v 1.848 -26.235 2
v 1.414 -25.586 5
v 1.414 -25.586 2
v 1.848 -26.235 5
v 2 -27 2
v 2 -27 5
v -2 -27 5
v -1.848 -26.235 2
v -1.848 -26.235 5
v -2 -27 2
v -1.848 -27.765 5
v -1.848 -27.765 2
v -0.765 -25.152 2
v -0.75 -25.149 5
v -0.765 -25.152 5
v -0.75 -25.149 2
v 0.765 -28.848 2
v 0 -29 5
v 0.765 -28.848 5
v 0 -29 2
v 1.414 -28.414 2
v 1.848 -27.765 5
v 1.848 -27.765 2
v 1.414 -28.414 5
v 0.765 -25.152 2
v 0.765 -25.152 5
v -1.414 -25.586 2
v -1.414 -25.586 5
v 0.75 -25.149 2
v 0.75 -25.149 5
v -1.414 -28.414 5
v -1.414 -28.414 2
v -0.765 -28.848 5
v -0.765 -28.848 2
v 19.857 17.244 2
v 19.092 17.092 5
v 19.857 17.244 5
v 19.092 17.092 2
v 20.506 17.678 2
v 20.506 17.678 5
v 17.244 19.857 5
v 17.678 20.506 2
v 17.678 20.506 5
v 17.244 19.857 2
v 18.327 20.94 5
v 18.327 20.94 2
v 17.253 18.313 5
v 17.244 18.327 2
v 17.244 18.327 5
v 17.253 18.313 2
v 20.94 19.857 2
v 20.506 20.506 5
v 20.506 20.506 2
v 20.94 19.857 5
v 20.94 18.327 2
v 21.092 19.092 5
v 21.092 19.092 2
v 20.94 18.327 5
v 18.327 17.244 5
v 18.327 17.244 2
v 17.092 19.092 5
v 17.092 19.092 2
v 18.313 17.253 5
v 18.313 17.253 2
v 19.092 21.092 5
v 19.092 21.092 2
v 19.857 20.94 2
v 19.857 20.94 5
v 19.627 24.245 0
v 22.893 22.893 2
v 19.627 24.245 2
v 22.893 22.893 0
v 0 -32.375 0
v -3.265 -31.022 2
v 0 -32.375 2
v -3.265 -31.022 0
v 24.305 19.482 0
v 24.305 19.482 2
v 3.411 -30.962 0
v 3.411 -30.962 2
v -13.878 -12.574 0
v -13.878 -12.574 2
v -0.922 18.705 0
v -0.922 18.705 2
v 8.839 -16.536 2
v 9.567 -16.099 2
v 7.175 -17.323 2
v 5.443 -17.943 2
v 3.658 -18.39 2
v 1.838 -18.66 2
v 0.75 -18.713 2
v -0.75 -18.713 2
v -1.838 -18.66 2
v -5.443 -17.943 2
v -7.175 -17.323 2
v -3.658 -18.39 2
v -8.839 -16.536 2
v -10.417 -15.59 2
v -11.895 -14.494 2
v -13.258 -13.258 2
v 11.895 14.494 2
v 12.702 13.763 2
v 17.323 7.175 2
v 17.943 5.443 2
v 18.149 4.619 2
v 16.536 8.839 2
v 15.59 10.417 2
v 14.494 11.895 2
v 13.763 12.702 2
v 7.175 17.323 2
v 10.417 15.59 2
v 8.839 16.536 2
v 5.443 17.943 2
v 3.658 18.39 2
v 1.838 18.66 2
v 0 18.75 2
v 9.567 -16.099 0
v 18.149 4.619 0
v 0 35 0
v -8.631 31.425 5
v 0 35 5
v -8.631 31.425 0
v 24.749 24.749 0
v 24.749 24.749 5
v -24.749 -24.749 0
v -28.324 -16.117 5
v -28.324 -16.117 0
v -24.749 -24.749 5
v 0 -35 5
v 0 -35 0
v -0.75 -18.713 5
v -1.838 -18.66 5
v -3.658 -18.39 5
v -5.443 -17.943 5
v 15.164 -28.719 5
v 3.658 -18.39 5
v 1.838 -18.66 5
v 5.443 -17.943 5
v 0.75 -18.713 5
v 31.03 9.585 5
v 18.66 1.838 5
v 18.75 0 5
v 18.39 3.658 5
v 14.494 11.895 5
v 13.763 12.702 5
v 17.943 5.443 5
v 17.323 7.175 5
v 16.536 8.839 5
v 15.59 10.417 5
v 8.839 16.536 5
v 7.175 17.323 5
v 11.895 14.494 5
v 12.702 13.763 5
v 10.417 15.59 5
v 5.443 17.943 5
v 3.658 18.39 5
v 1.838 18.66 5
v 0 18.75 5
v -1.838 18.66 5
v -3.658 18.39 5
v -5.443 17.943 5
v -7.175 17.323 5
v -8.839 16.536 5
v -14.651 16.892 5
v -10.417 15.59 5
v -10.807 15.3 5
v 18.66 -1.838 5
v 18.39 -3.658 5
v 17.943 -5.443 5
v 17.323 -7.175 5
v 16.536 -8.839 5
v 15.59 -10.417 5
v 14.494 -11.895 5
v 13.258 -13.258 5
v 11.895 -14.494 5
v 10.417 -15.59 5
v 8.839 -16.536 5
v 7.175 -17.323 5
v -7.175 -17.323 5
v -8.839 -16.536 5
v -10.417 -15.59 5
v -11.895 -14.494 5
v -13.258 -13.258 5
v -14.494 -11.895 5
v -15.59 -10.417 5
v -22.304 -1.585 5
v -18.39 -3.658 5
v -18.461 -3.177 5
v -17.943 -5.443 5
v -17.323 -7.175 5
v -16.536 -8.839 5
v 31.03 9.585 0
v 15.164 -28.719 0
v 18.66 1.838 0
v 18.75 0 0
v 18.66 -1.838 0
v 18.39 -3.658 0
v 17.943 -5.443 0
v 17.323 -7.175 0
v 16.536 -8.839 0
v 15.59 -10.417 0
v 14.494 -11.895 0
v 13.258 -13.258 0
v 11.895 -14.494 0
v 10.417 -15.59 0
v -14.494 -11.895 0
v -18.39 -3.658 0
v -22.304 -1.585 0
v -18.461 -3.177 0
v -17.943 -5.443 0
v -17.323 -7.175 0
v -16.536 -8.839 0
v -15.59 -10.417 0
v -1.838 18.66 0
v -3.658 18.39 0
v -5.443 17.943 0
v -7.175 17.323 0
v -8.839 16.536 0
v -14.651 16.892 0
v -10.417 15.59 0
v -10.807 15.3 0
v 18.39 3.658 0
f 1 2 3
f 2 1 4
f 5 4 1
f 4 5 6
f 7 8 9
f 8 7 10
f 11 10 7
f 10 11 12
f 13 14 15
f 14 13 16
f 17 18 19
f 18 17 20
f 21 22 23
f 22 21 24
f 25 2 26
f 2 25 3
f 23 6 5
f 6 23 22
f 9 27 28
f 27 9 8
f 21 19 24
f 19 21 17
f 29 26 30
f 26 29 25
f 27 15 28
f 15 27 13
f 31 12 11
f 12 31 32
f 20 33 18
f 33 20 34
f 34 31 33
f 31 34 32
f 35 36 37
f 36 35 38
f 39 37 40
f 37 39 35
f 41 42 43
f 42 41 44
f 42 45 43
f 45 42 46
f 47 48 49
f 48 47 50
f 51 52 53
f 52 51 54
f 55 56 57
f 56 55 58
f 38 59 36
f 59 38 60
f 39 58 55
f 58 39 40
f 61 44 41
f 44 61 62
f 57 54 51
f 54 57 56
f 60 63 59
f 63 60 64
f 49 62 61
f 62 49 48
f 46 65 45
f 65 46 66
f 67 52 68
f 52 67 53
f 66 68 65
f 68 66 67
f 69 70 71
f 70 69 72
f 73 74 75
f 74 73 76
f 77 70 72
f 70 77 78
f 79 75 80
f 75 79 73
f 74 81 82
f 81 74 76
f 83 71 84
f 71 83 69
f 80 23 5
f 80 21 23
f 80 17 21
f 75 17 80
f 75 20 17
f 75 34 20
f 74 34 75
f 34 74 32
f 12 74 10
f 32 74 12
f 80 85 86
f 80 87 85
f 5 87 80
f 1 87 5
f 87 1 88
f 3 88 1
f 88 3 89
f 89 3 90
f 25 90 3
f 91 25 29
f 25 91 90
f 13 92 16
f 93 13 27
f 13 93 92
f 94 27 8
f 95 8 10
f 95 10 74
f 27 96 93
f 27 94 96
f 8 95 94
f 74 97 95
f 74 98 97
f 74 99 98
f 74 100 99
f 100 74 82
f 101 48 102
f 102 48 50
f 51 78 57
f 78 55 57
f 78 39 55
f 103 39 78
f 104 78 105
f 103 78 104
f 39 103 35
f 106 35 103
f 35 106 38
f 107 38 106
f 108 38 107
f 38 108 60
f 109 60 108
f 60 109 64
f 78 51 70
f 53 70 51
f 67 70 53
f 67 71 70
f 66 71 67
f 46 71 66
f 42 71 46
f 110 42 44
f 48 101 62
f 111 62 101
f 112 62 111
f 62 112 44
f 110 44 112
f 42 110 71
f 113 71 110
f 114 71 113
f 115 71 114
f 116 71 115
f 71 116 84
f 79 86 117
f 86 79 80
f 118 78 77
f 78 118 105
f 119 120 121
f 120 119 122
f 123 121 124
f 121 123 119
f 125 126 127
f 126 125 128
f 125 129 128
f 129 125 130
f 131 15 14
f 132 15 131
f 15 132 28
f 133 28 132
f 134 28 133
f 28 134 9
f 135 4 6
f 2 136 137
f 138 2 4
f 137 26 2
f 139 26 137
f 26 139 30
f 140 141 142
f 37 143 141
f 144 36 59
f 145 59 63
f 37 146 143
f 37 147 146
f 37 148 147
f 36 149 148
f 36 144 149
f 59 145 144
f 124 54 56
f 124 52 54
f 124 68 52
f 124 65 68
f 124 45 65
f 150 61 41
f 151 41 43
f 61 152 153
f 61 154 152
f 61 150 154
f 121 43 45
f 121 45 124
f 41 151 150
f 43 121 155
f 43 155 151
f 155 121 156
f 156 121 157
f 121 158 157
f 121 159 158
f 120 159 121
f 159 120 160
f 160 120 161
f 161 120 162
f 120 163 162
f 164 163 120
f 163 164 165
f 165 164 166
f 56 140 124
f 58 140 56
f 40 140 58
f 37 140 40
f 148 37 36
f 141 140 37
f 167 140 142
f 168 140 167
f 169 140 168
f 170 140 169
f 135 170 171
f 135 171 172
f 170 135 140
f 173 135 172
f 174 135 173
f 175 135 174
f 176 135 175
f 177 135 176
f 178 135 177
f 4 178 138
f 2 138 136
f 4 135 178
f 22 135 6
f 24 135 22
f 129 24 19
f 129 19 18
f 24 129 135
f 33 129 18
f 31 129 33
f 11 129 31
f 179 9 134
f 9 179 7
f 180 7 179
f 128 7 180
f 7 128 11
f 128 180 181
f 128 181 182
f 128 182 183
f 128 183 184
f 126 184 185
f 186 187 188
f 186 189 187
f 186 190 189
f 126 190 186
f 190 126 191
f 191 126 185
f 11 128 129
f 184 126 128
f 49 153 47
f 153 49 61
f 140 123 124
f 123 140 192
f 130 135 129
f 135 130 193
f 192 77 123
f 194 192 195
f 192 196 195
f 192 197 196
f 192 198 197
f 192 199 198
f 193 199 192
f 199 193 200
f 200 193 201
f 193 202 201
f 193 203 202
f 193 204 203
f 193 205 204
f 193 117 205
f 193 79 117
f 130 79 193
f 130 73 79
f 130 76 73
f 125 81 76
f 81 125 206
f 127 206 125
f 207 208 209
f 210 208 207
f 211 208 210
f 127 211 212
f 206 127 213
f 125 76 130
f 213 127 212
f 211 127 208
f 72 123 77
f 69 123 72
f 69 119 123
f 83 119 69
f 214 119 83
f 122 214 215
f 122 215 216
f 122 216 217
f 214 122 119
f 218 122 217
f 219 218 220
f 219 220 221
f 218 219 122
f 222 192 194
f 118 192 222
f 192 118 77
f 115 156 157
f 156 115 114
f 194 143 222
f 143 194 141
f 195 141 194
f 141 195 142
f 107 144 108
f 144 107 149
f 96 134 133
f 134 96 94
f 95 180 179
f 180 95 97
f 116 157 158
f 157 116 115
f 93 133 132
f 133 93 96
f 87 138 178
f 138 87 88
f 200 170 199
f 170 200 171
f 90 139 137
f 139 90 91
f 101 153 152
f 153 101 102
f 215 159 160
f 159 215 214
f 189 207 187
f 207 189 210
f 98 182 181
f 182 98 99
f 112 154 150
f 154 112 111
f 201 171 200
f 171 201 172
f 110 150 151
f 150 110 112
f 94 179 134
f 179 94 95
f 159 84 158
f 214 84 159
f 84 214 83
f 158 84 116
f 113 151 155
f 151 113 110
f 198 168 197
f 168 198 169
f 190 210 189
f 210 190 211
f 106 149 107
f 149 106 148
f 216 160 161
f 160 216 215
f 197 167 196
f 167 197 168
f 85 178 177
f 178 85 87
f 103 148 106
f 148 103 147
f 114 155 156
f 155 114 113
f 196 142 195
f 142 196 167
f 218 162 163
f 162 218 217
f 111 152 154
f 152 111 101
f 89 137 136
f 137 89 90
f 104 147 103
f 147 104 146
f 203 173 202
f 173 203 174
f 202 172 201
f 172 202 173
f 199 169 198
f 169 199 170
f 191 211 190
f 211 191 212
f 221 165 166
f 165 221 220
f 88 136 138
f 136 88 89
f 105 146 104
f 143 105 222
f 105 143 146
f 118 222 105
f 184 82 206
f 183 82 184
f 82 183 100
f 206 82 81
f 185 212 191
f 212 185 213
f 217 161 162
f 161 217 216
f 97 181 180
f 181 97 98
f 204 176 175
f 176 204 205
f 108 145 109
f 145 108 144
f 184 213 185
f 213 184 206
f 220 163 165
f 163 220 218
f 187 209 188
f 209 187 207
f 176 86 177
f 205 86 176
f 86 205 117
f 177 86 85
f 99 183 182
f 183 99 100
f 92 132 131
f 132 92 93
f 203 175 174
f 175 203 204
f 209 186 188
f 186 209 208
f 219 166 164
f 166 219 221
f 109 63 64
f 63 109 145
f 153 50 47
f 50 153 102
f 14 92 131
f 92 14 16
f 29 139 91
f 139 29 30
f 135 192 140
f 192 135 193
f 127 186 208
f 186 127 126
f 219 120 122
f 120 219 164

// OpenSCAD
BASE_RADIUS = 18.75;
BASE_OUTER_RADIUS = 35;
SCREW_DISTANCE = 50;
SCREW_OFFSET = 10;
SCREW_HEIGHT = 2;
SCREW_RADIUS = 2;
SCREW_SUPPORT_THICKNESS = 1.5;
HEIGHT = 5;
NOTCH_WIDTH = 20;
NOTCH_HEIGHT = 6;
OUTER_SIDES = 8;

module screw() {
    translate([0, -(SCREW_DISTANCE / 2) - SCREW_RADIUS, -1]) {
        cylinder(SCREW_HEIGHT + 1, SCREW_RADIUS, SCREW_RADIUS, $fn = 16);
        
        translate([0, 0, SCREW_HEIGHT])
            cylinder(HEIGHT - SCREW_HEIGHT + 2, SCREW_RADIUS, SCREW_RADIUS, $fn = 16);
    }
}

difference() {
    // OUTER SHAPE
    rotate([0, 0, 360 / OUTER_SIDES])
        cylinder(HEIGHT, BASE_OUTER_RADIUS, BASE_OUTER_RADIUS, $fn = OUTER_SIDES);
    
    // OPENING
    translate([0, 0, -1])
        cylinder(HEIGHT + 2, BASE_RADIUS, BASE_RADIUS, $fn = 64);
    
    // BASE NOTCH
    rotate([0, 0, -22.5 - 180])
    translate([0, -NOTCH_WIDTH / 2, -1])    
        cube([40, NOTCH_WIDTH, NOTCH_HEIGHT + 1]);
    
    // SCREWS
    screw();
    mirror([0, 90, 0])
      rotate([0, 0, 45])
          screw();
    
    // SUPPORT SLICES
    rotate([0, 0, -45])
        translate([SCREW_SUPPORT_THICKNESS / -2, 0, -1])
            cube([SCREW_SUPPORT_THICKNESS, (SCREW_DISTANCE / 2) + SCREW_RADIUS, 10]);
    
    rotate([0, 0, -180])
        translate([SCREW_SUPPORT_THICKNESS / -2, 0, -1])
            cube([SCREW_SUPPORT_THICKNESS, (SCREW_DISTANCE / 2) + SCREW_RADIUS, 10]);

    // SCREW SUPPORTS 
    difference() {
      intersection() {
        rotate([0, 0, 360 / OUTER_SIDES])
          translate([0, 0, -1])
            cylinder(
              1 + 2.51, 
              BASE_OUTER_RADIUS * .925, 
              BASE_OUTER_RADIUS * .925, 
              $fn = OUTER_SIDES
            );

        rotate([0,0,-22.5 + 180])
          translate([0, 0, -1])  
            scale([.75, 1, 1])
              cylinder(3, 40, 40, $fn=3);
      }
      
      rotate([0, 0, 22.5 + 45])
        translate([-20, 10, -3])
            cube([40, 10, 10]);
    }
    
    rotate([0, 0, 22.5 + 45])
      translate([-30, -45, -3])
        cube([60, 20, 10]);
    
    rotate([0, 0, 22.5 + 45])
      translate([-30, 20, -3])
        cube([60, 20, 10]);
}
